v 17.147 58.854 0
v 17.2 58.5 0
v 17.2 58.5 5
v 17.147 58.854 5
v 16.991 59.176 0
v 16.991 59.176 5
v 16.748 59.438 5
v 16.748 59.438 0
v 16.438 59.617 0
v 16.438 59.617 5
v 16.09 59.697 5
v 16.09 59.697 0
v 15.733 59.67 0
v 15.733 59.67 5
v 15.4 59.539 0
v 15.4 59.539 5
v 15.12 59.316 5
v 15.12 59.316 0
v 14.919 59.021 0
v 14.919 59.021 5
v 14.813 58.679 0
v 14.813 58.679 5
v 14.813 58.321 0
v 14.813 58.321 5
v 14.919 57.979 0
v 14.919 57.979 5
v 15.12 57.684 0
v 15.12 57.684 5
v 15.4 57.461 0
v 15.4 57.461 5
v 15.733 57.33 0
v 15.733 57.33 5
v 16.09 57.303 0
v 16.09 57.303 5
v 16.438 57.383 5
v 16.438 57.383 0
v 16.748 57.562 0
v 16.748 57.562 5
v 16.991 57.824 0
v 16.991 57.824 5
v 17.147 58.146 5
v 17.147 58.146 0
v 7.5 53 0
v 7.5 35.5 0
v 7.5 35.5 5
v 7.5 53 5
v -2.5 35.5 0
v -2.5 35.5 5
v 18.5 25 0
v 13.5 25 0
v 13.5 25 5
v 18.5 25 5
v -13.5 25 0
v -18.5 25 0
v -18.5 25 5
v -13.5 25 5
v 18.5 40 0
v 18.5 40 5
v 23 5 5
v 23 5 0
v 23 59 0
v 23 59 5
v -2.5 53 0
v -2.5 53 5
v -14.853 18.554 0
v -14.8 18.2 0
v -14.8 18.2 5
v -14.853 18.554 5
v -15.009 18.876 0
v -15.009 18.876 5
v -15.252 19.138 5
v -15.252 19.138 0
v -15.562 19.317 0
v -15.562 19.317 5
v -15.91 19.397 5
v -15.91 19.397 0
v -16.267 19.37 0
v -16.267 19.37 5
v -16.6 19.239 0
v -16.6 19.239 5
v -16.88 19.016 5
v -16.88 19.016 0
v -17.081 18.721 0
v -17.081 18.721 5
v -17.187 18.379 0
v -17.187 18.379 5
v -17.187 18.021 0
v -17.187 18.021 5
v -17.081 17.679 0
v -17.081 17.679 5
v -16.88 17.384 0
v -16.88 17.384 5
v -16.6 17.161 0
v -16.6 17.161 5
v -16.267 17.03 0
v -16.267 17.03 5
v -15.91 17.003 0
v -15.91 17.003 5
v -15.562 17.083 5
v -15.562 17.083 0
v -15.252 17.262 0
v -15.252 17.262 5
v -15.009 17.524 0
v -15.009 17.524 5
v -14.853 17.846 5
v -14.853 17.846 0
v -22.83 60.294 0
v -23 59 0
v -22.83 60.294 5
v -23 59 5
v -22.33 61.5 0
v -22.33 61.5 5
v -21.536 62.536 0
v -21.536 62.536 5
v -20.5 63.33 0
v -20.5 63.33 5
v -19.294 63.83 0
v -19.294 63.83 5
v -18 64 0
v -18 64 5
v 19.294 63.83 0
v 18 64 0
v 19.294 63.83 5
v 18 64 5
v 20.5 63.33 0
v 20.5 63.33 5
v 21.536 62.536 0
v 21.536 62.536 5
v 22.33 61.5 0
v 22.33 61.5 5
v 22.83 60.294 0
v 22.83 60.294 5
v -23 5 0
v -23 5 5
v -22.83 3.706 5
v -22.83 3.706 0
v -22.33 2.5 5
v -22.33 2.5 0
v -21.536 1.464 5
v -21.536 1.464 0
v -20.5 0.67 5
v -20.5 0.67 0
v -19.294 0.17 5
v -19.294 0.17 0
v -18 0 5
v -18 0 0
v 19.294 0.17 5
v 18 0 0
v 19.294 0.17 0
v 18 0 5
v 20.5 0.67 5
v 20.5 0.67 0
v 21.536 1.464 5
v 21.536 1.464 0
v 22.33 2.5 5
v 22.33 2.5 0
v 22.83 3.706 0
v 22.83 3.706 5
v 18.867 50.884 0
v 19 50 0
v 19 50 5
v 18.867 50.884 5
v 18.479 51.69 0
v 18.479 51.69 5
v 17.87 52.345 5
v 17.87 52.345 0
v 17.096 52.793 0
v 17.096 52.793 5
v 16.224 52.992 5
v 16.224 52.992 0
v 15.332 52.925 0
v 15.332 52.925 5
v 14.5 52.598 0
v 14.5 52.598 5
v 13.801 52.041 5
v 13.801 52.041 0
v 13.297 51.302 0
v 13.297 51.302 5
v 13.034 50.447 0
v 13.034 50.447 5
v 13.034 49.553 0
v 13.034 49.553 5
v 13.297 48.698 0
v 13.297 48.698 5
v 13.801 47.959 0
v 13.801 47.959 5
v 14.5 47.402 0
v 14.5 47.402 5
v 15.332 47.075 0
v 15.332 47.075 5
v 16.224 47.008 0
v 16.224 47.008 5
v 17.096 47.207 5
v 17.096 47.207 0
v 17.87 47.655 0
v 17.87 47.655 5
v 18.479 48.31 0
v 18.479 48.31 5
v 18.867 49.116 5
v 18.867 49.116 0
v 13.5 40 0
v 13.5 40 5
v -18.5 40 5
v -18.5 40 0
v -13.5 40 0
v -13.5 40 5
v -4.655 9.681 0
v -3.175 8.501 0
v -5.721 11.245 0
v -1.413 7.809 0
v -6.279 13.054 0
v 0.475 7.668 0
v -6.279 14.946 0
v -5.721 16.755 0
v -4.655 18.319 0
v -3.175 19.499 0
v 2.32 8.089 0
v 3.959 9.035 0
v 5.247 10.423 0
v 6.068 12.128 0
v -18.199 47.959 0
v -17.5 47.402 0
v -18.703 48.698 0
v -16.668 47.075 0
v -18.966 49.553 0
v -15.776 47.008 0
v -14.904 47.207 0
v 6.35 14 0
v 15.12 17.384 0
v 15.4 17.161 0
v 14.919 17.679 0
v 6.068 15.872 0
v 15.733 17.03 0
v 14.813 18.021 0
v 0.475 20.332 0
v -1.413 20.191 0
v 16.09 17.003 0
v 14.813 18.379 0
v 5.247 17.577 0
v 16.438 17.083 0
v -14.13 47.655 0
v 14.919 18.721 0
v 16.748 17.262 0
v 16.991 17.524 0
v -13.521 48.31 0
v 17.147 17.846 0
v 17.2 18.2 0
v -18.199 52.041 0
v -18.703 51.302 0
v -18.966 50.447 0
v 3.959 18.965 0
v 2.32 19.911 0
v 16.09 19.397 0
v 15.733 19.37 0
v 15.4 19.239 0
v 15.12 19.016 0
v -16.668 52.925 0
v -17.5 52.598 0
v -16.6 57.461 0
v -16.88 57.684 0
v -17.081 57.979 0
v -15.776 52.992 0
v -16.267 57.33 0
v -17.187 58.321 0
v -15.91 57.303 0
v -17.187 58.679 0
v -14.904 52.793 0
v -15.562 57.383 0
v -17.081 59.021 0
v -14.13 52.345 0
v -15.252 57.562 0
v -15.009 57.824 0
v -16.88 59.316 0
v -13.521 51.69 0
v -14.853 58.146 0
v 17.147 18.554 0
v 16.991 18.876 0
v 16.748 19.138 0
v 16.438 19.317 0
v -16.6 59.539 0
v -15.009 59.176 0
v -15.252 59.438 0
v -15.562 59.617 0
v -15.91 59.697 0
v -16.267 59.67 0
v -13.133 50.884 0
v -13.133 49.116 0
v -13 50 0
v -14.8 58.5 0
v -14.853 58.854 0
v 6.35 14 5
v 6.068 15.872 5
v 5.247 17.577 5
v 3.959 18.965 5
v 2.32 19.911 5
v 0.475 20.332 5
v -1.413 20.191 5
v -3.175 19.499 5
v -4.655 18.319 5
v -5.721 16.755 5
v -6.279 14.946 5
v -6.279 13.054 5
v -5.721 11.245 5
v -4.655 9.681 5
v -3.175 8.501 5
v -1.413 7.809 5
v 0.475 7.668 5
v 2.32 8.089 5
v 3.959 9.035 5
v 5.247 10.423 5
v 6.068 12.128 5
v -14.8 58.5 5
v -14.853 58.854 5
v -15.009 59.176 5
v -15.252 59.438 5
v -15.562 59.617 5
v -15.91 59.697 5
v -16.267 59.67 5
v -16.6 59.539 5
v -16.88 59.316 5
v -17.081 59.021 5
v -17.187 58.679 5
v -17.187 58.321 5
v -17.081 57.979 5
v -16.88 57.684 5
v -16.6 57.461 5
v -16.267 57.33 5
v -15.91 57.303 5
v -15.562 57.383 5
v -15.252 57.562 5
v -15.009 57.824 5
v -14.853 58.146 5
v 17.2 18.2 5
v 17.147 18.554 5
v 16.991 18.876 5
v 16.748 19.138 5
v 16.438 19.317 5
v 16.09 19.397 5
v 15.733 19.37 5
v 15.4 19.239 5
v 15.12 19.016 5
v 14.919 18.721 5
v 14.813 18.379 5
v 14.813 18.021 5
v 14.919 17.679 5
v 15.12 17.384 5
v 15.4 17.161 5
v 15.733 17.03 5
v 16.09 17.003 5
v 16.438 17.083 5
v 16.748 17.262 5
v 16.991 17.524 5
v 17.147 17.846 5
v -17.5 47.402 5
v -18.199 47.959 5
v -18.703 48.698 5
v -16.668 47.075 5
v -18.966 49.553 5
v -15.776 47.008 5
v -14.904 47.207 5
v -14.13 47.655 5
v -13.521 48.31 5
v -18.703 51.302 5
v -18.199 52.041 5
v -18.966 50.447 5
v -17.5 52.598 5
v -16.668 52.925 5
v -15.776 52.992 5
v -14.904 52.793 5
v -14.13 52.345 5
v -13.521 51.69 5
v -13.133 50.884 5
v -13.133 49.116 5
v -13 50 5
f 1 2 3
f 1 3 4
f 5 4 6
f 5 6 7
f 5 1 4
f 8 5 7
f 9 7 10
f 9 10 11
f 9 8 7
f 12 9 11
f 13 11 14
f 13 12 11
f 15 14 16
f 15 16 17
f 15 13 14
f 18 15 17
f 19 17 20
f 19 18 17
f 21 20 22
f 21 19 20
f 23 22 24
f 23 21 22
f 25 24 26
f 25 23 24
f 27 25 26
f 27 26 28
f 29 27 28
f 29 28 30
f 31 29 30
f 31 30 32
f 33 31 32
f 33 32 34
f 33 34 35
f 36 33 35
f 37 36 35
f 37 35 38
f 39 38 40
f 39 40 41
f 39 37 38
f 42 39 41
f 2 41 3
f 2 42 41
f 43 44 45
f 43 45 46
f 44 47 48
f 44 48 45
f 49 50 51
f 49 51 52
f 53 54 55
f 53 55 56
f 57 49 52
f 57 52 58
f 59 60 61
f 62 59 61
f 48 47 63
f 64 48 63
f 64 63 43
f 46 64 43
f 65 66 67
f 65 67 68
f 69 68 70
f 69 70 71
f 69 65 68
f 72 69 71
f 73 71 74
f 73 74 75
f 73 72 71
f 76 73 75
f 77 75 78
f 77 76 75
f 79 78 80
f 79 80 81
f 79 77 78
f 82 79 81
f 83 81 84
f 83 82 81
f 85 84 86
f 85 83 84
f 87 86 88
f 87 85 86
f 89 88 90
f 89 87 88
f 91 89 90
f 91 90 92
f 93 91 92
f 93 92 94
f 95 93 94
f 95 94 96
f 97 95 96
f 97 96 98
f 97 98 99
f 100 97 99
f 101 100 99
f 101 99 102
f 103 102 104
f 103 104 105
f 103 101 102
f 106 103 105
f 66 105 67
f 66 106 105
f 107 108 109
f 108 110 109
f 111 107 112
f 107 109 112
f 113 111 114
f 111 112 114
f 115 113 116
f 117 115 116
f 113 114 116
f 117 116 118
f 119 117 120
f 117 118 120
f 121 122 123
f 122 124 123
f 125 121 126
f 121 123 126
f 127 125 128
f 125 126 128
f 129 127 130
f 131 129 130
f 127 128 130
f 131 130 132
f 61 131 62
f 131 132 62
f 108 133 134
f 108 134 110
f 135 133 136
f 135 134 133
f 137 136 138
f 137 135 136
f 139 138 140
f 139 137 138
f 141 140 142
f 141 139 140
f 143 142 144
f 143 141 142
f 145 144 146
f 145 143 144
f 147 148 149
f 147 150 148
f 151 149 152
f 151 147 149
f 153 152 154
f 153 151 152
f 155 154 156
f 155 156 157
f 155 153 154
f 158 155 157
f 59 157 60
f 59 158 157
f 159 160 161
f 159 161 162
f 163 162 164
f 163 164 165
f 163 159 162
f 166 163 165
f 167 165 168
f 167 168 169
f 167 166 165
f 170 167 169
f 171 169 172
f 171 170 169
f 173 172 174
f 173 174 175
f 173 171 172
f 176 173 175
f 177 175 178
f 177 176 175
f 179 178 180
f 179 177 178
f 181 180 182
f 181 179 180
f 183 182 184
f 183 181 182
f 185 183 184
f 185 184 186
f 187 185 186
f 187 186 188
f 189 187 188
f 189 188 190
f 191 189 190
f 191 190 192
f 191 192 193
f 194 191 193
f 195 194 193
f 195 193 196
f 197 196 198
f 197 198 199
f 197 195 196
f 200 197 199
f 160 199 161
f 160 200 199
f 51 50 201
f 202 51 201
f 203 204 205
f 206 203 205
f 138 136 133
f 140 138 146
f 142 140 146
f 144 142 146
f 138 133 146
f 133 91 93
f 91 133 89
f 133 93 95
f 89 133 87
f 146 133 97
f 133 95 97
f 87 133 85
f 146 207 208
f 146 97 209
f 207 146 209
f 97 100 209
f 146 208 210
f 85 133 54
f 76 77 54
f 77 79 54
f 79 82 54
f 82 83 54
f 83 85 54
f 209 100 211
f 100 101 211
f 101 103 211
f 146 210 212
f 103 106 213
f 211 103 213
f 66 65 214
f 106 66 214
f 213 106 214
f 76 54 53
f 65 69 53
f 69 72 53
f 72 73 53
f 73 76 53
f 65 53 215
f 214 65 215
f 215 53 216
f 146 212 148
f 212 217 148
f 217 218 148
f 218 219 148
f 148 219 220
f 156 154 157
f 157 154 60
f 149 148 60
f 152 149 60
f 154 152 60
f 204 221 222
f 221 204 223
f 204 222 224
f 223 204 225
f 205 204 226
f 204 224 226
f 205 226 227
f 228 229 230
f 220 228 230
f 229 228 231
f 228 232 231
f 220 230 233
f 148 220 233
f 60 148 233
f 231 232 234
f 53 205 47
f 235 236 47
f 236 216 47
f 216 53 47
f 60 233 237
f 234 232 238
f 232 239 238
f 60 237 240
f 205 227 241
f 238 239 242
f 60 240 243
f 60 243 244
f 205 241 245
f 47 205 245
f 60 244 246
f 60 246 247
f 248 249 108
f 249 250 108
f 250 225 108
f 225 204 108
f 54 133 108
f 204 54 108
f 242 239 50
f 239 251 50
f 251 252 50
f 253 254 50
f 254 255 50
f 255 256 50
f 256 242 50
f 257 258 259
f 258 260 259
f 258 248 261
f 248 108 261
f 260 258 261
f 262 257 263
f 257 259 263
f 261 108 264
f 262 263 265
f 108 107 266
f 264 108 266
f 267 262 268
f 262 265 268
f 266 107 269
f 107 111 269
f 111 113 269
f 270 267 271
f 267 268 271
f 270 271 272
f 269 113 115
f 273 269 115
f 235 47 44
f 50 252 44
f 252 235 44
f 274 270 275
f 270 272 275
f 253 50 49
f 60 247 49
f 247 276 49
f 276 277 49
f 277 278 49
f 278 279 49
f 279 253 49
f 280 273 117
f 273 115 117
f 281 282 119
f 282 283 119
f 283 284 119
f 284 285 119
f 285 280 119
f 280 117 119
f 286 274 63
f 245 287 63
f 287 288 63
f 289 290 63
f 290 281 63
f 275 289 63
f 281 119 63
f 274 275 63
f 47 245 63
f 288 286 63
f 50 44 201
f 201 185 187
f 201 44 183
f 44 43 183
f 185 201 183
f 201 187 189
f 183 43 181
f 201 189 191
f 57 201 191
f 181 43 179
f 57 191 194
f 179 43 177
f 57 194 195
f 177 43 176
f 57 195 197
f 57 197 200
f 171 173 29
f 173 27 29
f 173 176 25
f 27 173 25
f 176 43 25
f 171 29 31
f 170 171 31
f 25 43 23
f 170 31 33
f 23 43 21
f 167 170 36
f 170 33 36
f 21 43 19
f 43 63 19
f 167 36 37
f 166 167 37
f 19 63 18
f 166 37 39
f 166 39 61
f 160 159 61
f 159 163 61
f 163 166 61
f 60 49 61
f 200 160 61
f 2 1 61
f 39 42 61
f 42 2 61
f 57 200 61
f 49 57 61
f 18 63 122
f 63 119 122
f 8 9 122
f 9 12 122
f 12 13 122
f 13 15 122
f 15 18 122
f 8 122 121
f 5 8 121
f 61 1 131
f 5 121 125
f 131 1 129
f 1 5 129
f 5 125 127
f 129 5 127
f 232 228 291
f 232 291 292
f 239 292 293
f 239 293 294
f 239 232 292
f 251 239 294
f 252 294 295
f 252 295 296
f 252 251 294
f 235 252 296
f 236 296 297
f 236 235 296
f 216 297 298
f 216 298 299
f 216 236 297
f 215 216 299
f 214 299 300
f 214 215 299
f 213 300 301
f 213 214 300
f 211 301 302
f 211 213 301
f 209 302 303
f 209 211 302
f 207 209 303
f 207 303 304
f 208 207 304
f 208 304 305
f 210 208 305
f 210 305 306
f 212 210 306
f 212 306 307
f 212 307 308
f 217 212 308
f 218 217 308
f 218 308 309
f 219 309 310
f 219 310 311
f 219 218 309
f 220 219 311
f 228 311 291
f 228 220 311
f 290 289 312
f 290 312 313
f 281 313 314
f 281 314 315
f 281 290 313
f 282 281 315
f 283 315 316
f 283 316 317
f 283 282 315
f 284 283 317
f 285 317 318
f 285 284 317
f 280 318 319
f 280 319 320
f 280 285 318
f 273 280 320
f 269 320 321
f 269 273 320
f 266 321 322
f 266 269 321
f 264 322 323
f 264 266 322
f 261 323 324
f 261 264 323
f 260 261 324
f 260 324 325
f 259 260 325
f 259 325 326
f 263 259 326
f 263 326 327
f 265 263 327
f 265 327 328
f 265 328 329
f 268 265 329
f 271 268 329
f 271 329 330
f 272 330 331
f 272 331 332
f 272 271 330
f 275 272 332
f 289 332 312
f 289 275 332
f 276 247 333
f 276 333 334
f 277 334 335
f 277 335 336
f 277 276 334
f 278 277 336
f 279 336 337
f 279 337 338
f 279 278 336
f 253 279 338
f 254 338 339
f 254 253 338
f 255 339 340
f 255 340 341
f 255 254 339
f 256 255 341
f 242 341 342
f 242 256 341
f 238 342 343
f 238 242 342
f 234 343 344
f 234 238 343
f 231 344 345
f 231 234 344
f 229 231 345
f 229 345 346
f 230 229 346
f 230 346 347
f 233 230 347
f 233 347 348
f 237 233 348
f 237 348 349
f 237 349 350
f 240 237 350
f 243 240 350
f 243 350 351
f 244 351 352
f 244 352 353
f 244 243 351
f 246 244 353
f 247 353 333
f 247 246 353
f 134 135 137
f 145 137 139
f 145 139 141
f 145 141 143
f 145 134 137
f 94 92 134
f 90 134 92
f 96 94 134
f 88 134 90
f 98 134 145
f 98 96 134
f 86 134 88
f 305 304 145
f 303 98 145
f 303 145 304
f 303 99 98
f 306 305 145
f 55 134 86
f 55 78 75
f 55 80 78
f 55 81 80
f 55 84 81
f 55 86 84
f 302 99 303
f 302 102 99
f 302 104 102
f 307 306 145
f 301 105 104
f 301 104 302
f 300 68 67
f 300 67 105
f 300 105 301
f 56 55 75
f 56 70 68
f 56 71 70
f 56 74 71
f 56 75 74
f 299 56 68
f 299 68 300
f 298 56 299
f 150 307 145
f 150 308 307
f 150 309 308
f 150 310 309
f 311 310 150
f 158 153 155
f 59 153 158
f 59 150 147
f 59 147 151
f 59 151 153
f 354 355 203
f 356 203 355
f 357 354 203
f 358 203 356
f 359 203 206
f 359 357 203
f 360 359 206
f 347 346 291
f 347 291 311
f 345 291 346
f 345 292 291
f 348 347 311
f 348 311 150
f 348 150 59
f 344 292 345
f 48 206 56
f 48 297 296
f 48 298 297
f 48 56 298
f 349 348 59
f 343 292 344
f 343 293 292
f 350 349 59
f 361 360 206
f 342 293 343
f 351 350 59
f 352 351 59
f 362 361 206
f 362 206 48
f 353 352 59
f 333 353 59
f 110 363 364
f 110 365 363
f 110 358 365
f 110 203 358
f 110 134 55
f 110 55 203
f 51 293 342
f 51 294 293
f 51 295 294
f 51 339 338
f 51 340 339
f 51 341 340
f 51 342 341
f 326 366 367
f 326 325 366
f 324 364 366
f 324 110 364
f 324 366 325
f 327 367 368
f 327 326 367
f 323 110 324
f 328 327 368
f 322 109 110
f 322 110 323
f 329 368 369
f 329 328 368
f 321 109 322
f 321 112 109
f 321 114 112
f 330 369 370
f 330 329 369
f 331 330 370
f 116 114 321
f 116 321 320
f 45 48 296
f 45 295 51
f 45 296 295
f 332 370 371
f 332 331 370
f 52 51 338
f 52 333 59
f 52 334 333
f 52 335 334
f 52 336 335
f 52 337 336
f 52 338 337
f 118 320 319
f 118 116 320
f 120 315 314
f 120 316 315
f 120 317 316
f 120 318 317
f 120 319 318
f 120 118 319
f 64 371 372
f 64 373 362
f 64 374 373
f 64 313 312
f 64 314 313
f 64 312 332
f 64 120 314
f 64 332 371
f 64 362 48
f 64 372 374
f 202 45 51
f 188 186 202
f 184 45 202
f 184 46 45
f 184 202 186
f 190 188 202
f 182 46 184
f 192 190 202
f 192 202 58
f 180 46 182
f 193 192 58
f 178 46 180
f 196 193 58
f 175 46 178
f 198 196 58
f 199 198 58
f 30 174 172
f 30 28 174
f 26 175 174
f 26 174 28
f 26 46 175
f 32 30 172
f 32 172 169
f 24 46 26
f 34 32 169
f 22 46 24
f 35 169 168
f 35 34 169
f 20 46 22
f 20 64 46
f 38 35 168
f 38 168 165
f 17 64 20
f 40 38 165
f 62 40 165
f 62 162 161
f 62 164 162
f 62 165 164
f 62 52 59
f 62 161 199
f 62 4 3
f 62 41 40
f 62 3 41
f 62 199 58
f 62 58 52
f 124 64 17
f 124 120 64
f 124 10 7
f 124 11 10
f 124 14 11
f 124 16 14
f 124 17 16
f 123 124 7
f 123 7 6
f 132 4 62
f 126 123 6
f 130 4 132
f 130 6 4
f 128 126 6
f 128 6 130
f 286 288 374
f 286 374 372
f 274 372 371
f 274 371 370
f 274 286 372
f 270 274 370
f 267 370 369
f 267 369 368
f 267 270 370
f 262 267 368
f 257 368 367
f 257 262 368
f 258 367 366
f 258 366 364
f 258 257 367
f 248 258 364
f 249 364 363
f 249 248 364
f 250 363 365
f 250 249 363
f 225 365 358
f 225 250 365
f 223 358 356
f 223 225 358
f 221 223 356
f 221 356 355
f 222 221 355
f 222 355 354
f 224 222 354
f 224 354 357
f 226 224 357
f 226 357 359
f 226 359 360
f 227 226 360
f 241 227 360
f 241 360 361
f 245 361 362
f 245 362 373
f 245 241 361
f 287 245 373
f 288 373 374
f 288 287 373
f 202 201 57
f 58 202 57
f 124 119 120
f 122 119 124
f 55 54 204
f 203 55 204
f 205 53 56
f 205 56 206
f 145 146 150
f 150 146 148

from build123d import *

# Parameters (mm, degrees)
SKETCH1_W           = 46
SKETCH1_H           = 64
SKETCH1_R           = 3
SKETCH1_R_2         = 1.2
SKETCH1_R_3         = 6.35
SKETCH1_W_2         = 5
SKETCH1_H_2         = 15
SKETCH1_W_3         = 10
SKETCH1_H_3         = 17.5
BOSS_EXTRUDE1_DEPTH = 5
FILLET1_R           = 5


with BuildPart() as part:
    # Sketch1 → Boss-Extrude1 (new body)
    with BuildSketch(Plane.XY):
        with Locations((0, 32)):
            Rectangle(SKETCH1_W, SKETCH1_H)
        with Locations((16, 50)):
            Circle(SKETCH1_R, mode=Mode.SUBTRACT)
        with Locations((16, 18.2)):
            Circle(SKETCH1_R_2, mode=Mode.SUBTRACT)
        with Locations((16, 58.5)):
            Circle(SKETCH1_R_2, mode=Mode.SUBTRACT)
        with Locations((-16, 58.5)):
            Circle(SKETCH1_R_2, mode=Mode.SUBTRACT)
        with Locations((-16, 18.2)):
            Circle(SKETCH1_R_2, mode=Mode.SUBTRACT)
        with Locations((-16, 50)):
            Circle(SKETCH1_R, mode=Mode.SUBTRACT)
        with Locations((0, 14)):
            Circle(SKETCH1_R_3, mode=Mode.SUBTRACT)
        with Locations((16, 32.5)):
            Rectangle(SKETCH1_W_2, SKETCH1_H_2, mode=Mode.SUBTRACT)
        with Locations((2.5, 44.25)):
            Rectangle(SKETCH1_W_3, SKETCH1_H_3, mode=Mode.SUBTRACT)
        with Locations((-16, 32.5)):
            Rectangle(SKETCH1_W_2, SKETCH1_H_2, mode=Mode.SUBTRACT)
    extrude(amount=BOSS_EXTRUDE1_DEPTH)

    # Fillet1
    fillet1_edges = [part.edges().sort_by_distance(p)[0] for p in [
        (23, 0, 2.5),
        (-23, 0, 2.5),
        (-23, 64, 2.5),
        (23, 64, 2.5),
    ]]
    fillet(fillet1_edges, radius=FILLET1_R)


solid = part.part
